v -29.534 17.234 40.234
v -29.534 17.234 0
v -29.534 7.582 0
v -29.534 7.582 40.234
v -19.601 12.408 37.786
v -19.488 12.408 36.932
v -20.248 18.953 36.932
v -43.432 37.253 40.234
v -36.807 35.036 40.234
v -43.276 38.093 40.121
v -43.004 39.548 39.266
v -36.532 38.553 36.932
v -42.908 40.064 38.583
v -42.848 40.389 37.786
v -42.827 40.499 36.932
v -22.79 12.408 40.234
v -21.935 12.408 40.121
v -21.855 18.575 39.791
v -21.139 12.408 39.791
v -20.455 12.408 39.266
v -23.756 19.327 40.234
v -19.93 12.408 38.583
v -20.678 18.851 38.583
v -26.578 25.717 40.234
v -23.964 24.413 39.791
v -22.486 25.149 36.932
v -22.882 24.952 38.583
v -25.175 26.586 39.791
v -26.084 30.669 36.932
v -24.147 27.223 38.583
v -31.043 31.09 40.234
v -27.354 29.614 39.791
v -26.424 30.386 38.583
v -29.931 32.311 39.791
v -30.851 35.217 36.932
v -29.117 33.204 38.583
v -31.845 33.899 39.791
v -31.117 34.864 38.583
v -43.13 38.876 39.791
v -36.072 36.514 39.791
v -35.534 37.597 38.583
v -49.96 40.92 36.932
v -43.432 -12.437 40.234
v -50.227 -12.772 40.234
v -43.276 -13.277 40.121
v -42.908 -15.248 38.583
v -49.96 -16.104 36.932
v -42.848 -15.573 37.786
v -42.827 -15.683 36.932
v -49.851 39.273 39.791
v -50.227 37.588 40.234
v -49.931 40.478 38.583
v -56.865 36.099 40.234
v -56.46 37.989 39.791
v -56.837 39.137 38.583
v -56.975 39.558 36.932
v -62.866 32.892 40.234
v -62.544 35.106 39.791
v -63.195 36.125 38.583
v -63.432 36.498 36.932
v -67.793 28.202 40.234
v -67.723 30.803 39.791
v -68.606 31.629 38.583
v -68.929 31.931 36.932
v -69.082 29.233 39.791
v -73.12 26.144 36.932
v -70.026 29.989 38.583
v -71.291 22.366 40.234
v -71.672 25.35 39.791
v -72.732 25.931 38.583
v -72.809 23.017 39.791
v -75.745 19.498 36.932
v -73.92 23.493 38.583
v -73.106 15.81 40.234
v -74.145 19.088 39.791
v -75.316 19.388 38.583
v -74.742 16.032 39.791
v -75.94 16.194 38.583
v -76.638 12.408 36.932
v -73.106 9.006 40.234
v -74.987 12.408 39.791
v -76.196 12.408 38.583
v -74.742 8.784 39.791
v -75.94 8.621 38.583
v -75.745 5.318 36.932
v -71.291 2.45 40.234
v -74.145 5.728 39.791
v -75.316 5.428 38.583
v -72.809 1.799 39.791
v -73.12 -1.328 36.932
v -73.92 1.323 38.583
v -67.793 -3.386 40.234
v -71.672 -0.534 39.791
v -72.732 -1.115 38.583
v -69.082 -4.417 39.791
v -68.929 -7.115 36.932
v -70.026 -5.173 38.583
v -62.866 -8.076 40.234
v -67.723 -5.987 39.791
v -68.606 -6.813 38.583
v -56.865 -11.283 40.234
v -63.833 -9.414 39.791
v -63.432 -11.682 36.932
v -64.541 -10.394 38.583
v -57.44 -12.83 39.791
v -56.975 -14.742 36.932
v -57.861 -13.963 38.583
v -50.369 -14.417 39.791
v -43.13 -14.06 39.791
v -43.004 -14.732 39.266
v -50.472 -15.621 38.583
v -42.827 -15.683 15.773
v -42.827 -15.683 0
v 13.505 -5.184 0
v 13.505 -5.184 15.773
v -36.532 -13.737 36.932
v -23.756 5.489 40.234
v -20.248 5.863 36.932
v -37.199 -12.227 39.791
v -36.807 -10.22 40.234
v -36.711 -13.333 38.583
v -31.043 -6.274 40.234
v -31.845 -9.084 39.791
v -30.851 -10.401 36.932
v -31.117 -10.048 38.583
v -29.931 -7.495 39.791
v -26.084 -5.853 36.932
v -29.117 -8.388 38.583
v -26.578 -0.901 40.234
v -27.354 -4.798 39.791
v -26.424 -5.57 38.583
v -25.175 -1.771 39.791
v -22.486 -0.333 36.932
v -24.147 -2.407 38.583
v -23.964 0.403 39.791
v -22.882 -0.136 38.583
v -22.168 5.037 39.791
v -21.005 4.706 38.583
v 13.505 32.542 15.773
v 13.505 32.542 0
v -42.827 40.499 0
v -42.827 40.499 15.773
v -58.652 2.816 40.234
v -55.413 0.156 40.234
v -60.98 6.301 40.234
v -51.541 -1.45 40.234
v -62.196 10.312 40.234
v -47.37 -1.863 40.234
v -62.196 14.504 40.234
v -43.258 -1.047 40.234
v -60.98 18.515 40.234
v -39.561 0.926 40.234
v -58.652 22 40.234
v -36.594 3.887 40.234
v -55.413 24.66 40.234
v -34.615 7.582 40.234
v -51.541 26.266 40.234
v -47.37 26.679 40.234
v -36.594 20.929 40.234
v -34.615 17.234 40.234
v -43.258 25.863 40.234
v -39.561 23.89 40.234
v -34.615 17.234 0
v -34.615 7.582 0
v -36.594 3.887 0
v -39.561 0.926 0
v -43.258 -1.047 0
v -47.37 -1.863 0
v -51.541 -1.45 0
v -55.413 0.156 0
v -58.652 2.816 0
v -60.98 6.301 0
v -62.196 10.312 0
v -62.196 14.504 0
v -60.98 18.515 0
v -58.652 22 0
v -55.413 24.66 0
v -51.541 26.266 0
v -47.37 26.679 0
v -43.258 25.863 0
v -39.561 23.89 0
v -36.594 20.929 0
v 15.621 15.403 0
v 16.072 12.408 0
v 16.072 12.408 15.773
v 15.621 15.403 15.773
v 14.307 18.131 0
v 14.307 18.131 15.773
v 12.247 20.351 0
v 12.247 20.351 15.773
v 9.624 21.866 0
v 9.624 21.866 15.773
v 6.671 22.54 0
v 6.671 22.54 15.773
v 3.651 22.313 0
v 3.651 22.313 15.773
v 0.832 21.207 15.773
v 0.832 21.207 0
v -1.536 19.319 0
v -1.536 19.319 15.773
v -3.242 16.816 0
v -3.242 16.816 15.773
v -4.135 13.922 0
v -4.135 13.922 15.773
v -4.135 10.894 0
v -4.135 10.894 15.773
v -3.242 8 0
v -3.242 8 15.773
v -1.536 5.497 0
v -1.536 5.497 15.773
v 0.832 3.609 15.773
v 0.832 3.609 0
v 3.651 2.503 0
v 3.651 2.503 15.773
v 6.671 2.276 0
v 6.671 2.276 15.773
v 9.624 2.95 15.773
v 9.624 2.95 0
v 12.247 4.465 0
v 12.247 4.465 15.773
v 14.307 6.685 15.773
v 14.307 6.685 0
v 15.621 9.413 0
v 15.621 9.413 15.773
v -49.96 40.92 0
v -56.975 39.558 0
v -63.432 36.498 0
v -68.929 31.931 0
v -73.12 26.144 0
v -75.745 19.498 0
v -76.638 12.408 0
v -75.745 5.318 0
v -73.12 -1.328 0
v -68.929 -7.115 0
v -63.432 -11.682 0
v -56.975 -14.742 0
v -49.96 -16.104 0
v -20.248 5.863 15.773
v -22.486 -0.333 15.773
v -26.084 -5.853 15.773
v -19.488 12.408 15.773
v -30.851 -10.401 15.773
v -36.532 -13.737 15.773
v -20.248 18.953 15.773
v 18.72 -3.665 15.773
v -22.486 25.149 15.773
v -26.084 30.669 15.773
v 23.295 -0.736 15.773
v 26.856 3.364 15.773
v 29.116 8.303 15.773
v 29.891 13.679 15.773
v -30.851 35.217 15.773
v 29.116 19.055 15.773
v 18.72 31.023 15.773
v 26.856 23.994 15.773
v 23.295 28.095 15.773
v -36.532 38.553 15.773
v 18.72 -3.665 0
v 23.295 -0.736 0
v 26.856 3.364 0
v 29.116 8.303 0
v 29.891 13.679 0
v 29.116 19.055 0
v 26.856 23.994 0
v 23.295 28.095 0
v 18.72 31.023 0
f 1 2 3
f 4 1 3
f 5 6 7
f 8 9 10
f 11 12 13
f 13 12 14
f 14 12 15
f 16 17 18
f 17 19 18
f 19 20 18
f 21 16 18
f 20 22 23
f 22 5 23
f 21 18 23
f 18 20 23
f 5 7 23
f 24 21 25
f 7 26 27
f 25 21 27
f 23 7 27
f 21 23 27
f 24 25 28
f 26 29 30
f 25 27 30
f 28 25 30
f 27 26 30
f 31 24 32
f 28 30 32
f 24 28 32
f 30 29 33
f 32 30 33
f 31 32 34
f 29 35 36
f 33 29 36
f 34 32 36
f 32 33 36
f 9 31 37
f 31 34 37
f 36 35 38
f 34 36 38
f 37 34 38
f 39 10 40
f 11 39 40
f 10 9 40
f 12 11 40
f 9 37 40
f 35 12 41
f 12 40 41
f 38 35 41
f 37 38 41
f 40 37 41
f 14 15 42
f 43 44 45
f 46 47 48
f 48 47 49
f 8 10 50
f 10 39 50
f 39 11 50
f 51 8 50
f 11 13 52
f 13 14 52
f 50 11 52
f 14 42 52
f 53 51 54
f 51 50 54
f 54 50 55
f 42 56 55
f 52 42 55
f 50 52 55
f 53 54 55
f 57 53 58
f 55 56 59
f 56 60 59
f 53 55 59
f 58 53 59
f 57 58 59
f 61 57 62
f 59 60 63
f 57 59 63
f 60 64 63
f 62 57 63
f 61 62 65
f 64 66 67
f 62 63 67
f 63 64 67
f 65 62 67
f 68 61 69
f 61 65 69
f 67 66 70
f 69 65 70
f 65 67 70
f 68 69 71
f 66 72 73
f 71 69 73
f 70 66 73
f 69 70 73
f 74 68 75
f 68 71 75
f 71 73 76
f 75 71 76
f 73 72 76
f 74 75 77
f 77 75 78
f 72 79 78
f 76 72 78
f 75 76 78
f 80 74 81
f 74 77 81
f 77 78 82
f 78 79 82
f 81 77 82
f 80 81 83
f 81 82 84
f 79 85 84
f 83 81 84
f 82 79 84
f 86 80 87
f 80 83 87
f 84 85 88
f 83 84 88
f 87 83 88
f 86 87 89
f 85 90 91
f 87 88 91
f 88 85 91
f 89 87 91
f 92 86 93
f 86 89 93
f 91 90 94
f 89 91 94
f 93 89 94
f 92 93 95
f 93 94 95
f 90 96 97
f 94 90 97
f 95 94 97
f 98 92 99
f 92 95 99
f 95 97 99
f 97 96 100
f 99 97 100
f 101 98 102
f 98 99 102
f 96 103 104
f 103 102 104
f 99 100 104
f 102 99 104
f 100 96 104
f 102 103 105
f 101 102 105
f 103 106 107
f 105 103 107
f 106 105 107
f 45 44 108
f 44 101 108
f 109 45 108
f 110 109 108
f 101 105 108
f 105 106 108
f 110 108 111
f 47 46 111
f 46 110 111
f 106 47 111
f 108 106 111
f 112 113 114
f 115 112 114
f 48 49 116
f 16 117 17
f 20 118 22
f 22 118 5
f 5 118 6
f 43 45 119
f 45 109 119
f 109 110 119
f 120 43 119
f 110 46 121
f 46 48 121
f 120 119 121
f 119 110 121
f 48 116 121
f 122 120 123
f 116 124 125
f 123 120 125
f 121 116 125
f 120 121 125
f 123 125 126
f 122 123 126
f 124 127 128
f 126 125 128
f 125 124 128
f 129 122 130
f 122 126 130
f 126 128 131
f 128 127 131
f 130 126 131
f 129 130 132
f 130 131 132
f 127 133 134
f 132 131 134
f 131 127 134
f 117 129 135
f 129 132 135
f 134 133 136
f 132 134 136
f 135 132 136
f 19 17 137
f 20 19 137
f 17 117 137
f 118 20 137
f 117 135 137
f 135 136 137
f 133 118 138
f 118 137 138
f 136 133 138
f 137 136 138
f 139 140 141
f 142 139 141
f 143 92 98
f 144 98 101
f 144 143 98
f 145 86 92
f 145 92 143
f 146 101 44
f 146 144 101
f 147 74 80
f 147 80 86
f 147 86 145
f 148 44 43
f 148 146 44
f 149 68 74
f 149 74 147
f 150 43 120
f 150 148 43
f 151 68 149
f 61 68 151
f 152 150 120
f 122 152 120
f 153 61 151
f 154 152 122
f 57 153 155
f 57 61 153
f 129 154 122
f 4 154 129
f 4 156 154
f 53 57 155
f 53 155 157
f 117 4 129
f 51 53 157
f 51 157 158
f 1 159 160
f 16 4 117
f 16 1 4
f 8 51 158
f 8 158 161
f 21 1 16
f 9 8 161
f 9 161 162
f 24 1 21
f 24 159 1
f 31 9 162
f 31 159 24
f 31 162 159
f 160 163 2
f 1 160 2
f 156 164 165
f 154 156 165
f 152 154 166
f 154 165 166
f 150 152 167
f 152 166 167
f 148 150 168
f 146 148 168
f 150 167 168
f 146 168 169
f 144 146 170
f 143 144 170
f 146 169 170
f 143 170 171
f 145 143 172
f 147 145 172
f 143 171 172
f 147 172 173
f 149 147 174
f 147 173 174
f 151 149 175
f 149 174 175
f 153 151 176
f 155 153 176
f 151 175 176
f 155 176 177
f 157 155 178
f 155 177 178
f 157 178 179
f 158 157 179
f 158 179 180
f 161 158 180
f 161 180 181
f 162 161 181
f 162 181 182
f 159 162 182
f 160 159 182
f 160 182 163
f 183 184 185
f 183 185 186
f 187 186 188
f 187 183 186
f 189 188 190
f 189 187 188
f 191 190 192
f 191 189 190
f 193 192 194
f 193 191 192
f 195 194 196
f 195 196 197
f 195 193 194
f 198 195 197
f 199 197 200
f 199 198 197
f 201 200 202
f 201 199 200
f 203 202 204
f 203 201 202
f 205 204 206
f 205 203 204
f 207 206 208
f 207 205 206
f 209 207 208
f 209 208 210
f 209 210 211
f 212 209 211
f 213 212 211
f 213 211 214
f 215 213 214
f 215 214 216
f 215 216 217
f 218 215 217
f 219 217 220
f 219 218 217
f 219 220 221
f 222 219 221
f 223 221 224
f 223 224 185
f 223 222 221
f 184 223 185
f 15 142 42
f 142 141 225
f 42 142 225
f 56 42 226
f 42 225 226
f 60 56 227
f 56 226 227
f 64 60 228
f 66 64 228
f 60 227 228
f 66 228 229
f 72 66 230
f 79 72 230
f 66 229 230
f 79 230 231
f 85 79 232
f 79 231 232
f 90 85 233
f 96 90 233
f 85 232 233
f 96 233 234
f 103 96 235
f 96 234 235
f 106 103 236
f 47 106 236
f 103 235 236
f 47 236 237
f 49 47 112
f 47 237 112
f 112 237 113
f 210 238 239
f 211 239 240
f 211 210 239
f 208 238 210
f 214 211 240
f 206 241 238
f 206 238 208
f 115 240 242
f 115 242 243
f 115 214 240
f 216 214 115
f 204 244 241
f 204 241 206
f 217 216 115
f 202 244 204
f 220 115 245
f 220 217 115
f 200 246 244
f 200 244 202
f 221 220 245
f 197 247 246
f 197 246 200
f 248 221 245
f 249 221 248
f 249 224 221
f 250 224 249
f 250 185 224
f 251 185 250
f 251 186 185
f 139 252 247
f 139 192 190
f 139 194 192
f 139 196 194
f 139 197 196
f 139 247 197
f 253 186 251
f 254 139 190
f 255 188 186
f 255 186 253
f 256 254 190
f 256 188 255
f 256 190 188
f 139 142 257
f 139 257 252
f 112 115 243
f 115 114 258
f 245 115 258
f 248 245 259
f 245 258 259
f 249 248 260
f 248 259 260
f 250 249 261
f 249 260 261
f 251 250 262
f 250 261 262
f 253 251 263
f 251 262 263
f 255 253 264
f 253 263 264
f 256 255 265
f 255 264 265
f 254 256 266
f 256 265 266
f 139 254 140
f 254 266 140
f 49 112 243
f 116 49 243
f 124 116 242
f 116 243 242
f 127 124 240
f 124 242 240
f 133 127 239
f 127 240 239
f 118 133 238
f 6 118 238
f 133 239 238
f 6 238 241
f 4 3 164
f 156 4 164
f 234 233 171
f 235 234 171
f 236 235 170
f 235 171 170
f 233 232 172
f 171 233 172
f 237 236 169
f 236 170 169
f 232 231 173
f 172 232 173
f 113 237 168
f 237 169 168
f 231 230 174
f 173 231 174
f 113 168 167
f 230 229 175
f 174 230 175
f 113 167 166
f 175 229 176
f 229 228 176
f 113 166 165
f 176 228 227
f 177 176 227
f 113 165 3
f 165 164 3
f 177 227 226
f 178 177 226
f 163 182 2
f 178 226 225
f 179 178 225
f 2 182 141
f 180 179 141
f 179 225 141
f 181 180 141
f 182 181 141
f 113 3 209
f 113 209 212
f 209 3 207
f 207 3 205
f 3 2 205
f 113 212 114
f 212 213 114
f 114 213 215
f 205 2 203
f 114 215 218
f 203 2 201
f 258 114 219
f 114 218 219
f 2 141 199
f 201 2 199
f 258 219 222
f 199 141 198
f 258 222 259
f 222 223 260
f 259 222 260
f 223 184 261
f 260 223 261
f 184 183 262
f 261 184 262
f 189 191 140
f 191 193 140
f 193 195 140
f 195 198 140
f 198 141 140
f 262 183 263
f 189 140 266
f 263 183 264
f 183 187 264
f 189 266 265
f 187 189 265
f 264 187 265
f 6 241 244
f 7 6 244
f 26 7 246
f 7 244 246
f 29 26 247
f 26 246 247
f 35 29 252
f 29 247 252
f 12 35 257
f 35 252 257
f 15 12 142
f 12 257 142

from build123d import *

# Parameters (mm, degrees)
F1_DEPTH = 40.2336
F0_R     = 10.16
F2_DEPTH = 15.7734
F3_R     = 3.302


with BuildPart() as f1:
    # F0 (on Top) → F1 (new body)
    with BuildSketch(Plane.XY):
        with BuildLine():
            ThreePointArc((-42.827169, -15.683244), (-26.084127, -5.852856), (-19.488047, 12.407968))
            ThreePointArc((-19.488047, 12.407968), (-26.084127, 30.668792), (-42.827169, 40.49918))
            ThreePointArc((-42.827169, 40.49918), (-76.638047, 12.407968), (-42.827169, -15.683244))
        make_face()
        with BuildLine():
            ThreePointArc((-34.615282, 7.581968), (-62.350547, 12.407968), (-34.615282, 17.233968))
            Line((-34.615282, 17.233968), (-29.533747, 17.233968))
            Line((-29.533747, 17.233968), (-29.533747, 7.581968))
            Line((-29.533747, 7.581968), (-34.615282, 7.581968))
        make_face(mode=Mode.SUBTRACT)
    extrude(amount=F1_DEPTH)

    # F0 (on Top) → F2 (join)
    with BuildSketch(Plane.XY):
        with BuildLine():
            ThreePointArc((-42.827169, -15.683244), (-26.084127, -5.852856), (-19.488047, 12.407968))
            ThreePointArc((-19.488047, 12.407968), (-26.084127, 30.668792), (-42.827169, 40.49918))
            ThreePointArc((-42.827169, 40.49918), (-76.638047, 12.407968), (-42.827169, -15.683244))
        make_face()
        with BuildLine():
            ThreePointArc((-34.615282, 7.581968), (-62.350547, 12.407968), (-34.615282, 17.233968))
            Line((-34.615282, 17.233968), (-29.533747, 17.233968))
            Line((-29.533747, 17.233968), (-29.533747, 7.581968))
            Line((-29.533747, 7.581968), (-34.615282, 7.581968))
        make_face(mode=Mode.SUBTRACT)
        with BuildLine():
            ThreePointArc((-42.827169, 40.49918), (-26.084127, 30.668792), (-19.488047, 12.407968))
            ThreePointArc((-19.488047, 12.407968), (-26.084127, -5.852856), (-42.827169, -15.683244))
            Line((-42.827169, -15.683244), (13.505259, -5.183529))
            ThreePointArc((13.505259, -5.183529), (29.890809, 13.679218), (13.505259, 32.541964))
            Line((13.505259, 32.541964), (-42.827169, 40.49918))
        make_face()
        with Locations((5.911953, 12.407968)):
            Circle(F0_R, mode=Mode.SUBTRACT)
    extrude(amount=F2_DEPTH)

    # F3
    f3_edges = [f1.edges().sort_by_distance(p)[0] for p in [
        (-53.298926, 40.49918, 40.2336),
    ]]
    fillet(f3_edges, radius=F3_R)


solid = f1.part
